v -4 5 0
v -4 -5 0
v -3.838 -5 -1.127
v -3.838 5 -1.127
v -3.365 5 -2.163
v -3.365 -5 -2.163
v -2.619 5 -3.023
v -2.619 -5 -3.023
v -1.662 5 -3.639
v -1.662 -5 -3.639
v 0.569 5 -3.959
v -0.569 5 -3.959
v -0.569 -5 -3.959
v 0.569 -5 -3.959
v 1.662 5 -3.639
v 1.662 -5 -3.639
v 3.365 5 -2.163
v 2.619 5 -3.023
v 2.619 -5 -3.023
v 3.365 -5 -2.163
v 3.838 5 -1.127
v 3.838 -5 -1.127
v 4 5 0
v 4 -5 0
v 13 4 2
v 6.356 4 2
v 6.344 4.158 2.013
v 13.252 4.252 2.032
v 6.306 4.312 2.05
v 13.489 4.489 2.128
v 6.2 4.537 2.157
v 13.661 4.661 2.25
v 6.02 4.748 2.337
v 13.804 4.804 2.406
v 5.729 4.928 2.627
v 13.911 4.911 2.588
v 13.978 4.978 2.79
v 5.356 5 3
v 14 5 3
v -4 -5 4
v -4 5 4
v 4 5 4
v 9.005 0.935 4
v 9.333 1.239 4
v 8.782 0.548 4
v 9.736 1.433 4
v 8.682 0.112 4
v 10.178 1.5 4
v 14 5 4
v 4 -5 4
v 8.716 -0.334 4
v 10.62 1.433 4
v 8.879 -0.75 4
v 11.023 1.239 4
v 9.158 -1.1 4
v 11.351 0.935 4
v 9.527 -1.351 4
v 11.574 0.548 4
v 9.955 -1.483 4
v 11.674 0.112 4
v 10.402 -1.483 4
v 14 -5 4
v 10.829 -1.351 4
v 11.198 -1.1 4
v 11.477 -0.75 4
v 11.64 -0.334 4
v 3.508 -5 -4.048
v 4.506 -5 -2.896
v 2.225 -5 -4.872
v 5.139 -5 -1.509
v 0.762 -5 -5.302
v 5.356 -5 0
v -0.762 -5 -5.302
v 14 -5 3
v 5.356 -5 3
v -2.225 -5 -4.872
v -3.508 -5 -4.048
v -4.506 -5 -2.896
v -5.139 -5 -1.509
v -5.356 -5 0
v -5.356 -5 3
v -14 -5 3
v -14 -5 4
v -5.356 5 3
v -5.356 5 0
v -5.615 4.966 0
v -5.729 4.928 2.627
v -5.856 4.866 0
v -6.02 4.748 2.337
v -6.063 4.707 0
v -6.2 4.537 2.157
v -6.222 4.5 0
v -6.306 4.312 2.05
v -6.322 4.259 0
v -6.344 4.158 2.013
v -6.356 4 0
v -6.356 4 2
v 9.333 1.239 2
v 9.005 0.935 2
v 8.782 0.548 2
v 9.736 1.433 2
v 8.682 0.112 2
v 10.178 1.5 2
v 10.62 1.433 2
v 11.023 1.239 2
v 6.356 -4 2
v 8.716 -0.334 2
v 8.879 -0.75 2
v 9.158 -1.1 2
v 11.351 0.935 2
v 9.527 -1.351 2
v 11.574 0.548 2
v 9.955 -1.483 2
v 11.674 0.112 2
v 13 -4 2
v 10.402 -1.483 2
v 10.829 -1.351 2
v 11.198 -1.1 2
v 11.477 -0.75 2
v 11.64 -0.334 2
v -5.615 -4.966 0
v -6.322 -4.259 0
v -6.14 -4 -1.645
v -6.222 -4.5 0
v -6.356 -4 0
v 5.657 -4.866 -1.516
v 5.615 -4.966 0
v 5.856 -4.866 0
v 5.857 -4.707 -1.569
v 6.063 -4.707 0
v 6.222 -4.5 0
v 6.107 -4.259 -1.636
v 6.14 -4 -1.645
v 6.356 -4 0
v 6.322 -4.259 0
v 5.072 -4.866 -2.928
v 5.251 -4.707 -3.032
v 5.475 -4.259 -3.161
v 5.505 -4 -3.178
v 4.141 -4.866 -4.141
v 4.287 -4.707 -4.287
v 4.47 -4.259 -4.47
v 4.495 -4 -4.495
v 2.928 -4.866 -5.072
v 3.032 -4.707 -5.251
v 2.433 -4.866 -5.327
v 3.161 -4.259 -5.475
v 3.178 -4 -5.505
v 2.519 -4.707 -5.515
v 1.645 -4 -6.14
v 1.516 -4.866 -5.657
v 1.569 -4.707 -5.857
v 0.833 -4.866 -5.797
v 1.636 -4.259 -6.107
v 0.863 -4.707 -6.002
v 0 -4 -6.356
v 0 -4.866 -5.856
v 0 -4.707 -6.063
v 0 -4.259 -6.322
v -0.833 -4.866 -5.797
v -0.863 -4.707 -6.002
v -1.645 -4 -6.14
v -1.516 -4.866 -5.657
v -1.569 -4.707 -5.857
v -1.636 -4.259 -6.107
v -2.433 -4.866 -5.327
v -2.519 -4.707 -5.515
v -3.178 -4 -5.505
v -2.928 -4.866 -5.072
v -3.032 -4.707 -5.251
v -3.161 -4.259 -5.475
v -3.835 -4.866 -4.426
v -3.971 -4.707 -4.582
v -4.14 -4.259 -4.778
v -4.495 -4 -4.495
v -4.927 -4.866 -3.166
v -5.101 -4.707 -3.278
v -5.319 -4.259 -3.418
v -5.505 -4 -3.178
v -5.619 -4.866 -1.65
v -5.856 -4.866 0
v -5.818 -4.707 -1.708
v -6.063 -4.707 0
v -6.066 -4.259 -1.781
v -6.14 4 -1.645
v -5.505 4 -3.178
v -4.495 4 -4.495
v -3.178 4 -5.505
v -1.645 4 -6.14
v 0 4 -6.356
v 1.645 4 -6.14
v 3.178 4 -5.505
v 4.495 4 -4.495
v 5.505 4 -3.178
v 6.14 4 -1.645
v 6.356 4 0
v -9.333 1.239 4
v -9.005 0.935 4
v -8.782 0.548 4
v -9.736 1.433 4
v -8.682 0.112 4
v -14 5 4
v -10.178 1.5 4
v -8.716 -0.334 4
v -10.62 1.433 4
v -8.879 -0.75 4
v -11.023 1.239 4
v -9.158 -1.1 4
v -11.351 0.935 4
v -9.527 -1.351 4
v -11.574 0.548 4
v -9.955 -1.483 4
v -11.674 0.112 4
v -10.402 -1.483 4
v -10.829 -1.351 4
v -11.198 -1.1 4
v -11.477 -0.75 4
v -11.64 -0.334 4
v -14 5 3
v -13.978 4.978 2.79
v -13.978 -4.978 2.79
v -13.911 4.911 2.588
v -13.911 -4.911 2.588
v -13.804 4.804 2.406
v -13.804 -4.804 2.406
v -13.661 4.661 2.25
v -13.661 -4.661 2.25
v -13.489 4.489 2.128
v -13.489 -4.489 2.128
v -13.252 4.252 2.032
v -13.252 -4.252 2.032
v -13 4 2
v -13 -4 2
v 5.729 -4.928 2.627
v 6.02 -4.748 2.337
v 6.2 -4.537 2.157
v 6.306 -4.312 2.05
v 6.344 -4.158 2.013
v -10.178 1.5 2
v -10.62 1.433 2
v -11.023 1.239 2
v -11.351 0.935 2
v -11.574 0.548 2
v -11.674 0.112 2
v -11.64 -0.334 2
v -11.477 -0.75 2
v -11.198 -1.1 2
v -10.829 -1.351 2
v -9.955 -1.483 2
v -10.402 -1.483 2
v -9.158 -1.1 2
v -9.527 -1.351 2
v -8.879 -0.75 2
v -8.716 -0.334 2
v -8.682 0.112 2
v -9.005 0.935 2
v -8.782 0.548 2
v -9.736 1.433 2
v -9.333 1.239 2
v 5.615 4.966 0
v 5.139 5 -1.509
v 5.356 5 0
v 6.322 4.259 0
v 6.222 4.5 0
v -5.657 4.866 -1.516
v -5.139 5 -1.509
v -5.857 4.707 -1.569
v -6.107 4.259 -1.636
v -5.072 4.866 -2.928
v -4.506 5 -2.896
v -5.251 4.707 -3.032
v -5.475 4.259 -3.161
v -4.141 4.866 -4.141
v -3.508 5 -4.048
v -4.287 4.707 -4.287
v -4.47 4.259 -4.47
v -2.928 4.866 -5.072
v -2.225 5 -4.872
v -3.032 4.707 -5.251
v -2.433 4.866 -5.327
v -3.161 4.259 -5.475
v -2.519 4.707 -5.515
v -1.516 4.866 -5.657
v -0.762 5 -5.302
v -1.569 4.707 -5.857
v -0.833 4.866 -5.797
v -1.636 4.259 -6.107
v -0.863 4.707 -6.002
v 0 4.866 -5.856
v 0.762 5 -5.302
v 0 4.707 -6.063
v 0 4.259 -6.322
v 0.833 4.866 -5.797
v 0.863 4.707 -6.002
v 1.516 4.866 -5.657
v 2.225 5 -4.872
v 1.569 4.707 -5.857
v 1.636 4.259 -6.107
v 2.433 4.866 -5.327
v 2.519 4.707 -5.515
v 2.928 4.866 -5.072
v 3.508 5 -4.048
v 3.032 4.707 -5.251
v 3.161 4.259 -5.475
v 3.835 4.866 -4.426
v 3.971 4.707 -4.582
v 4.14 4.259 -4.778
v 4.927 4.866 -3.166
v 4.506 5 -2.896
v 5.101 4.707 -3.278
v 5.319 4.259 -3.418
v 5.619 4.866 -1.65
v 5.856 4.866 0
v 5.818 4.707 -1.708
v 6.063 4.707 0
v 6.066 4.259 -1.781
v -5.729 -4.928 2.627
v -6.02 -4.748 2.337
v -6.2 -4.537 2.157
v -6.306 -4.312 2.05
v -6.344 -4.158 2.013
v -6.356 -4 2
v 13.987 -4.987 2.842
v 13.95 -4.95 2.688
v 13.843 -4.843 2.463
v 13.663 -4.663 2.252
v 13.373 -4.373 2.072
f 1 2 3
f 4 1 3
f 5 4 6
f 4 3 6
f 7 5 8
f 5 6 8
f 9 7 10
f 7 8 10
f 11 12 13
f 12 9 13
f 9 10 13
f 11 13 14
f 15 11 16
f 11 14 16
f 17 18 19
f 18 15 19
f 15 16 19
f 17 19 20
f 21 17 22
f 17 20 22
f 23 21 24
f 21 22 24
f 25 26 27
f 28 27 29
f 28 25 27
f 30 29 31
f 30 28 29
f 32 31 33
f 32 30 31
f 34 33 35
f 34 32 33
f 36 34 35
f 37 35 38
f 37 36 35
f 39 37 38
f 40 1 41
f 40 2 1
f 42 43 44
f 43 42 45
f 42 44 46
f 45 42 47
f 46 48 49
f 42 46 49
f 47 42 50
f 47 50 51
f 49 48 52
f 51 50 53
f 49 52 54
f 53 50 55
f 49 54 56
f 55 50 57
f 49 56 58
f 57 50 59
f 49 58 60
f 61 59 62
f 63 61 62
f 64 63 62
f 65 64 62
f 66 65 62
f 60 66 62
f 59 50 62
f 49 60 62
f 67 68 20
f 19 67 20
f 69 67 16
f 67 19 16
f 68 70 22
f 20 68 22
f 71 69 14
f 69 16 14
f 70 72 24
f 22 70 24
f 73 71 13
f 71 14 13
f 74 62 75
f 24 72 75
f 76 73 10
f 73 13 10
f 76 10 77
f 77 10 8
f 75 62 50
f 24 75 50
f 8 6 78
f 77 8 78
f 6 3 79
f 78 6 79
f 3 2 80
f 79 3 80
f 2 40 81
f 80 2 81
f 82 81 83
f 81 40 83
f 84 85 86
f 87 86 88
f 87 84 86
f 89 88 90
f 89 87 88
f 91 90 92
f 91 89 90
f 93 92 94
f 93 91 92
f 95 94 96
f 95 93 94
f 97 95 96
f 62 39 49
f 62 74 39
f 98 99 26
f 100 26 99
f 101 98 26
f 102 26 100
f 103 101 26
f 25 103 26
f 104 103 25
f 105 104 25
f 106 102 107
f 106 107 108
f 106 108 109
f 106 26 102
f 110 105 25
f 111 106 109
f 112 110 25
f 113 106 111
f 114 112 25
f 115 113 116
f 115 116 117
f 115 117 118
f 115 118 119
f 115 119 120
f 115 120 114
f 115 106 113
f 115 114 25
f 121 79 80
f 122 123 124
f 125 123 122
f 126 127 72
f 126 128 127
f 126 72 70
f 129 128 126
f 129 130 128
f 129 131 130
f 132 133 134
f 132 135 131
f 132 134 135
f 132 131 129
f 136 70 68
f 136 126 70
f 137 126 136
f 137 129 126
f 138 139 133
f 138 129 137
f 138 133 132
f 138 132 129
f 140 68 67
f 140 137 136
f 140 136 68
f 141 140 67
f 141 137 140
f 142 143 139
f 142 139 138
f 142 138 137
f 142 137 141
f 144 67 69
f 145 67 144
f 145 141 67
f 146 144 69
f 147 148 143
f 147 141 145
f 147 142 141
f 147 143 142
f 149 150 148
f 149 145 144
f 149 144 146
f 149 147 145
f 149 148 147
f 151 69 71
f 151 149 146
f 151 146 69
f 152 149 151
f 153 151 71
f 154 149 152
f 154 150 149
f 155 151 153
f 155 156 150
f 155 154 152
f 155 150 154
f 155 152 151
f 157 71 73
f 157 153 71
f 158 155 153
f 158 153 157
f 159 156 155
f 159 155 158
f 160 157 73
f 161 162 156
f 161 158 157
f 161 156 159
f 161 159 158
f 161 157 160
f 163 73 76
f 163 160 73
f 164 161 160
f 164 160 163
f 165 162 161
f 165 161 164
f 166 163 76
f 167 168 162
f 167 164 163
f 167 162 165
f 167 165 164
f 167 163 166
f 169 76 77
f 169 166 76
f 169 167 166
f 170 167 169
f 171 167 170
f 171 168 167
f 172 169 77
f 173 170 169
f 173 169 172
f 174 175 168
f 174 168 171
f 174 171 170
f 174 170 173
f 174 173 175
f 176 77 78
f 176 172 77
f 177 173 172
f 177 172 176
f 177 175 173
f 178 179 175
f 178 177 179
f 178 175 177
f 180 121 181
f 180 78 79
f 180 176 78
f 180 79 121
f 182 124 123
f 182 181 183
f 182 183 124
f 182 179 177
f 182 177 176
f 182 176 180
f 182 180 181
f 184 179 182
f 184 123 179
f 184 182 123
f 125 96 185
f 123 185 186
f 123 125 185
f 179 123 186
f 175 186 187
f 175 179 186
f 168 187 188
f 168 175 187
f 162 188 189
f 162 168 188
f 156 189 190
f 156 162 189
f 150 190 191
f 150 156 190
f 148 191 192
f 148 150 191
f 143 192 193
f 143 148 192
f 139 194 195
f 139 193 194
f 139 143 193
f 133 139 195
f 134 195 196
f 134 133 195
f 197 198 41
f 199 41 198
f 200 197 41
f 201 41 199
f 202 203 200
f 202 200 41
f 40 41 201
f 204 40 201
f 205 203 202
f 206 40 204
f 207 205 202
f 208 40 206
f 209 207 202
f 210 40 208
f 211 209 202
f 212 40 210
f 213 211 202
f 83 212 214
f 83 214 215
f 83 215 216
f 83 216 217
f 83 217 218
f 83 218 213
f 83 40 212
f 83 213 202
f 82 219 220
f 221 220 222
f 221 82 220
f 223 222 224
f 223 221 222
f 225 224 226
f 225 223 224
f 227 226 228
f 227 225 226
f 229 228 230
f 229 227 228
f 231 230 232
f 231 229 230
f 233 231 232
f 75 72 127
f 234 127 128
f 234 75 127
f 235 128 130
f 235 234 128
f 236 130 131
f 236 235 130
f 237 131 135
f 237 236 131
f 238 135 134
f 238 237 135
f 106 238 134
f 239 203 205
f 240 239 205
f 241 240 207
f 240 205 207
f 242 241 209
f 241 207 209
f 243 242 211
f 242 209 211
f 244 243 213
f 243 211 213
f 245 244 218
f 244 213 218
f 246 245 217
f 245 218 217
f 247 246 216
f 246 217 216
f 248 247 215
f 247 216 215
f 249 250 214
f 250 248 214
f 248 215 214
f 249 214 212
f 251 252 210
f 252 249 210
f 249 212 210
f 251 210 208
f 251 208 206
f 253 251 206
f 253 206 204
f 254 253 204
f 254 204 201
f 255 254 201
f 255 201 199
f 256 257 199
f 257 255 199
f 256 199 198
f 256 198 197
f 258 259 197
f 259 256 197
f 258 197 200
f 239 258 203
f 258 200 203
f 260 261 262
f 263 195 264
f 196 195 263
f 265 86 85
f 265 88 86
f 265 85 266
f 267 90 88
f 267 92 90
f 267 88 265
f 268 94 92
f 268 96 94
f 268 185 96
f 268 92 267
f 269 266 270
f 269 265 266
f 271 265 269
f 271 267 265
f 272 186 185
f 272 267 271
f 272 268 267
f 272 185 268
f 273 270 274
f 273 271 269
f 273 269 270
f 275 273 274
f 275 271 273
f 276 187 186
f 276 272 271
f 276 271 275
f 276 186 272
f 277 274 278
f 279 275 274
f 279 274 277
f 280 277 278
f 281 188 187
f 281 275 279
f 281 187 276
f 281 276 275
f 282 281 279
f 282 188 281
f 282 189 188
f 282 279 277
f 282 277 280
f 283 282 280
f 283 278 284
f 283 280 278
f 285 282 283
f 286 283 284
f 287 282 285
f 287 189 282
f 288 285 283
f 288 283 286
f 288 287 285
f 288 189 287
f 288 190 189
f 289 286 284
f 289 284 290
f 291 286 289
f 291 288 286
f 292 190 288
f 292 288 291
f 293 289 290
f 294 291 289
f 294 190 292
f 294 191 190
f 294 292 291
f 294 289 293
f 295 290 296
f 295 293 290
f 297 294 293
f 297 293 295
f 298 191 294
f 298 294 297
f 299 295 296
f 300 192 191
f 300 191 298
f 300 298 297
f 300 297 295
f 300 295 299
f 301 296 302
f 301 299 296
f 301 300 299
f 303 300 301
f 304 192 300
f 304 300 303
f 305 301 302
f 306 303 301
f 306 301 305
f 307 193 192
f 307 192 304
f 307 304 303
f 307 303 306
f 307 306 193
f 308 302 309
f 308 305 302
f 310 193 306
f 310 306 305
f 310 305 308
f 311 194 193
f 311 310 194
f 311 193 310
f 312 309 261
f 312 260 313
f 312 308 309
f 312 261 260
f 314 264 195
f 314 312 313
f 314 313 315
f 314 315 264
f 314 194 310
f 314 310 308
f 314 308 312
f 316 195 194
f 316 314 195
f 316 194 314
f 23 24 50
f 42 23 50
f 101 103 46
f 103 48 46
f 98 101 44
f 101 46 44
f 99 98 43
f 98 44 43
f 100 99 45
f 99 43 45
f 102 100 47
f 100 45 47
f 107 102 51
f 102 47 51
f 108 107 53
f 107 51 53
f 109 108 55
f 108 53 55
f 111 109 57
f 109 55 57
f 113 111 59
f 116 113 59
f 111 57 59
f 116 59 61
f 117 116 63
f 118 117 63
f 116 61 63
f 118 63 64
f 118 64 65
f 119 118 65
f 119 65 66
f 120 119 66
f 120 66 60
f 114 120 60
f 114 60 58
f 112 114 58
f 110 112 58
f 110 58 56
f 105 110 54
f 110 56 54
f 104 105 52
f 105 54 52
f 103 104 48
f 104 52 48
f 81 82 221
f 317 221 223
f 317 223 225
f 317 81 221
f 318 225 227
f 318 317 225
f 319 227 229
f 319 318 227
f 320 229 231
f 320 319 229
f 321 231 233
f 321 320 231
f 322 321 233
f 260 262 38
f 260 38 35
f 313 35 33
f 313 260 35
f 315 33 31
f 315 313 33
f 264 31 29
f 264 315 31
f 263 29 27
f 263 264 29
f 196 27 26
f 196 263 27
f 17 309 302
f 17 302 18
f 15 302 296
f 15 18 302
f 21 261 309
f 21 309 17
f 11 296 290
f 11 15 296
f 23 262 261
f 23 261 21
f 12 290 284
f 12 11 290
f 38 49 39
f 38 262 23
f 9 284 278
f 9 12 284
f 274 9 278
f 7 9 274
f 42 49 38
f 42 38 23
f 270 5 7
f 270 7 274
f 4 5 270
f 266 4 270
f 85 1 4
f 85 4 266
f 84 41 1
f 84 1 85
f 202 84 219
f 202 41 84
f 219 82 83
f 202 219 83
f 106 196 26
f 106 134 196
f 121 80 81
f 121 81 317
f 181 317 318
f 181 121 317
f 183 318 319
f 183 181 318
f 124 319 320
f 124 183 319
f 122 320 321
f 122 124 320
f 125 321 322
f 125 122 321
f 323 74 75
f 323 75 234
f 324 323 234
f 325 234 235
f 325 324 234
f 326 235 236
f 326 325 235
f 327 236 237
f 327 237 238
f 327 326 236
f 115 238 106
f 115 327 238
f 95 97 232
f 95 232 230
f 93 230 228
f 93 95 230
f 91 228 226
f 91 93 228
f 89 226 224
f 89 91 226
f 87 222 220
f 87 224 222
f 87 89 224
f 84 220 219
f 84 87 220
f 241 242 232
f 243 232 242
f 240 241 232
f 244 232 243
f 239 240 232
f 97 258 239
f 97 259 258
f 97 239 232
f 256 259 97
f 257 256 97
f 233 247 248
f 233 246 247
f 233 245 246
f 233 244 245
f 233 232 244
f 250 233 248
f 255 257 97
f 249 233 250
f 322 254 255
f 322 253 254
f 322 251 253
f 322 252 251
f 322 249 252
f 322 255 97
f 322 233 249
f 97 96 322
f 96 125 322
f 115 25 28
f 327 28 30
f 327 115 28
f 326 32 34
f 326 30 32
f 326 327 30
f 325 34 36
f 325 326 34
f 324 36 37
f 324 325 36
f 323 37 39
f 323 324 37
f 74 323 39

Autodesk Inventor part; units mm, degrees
ref_plane "YZ Plane" through (0, 0, 0) normal (1, 0, 0) x (0, 1, 0)
ref_plane "XZ Plane" through (0, 0, 0) normal (0, 1, 0) x (-1, 0, 0)
ref_plane "XY Plane" through (0, 0, 0) normal (0, 0, 1) x (1, 0, 0)
sketch "Sketch1" plane through (0, 0, 0) normal (0, 1, 0) x (-1, 0, 0)
  arc A0 (-4, 0) -> (4, 0) centre (0, 0) ccw
  line L0 (-4, 4) -> (-14, 4)
  line L1 (4, 4) -> (14, 4)
  line L2 (14, 2) -> (6.3562, 2)
  line L3 (-6.3562, 2) -> (-14, 2)
  line L4 (4, 0) -> (4, 4)
  line L5 (-4, 0) -> (-4, 4)
  line L6 (6.3562, 0) -> (6.3562, 2)
  line L7 (-6.3562, 0) -> (-6.3562, 2)
  arc A1 (-6.3562, 0) -> (6.3562, 0) centre (0, 0) ccw
  line L8 (14, 2) -> (14, 4)
  line L9 (-14, 2) -> (-14, 4)
  dimension "d0" = 8
  dimension "d2" = 2
  dimension "d3" = 10
  dimension "d4" = 10
  dimension "d5" = 6.3562
  dimension "d6" = 2
extrude "Extrusion1" add sketch "Sketch1" along normal mid plane 10
sketch "Sketch2" plane through (14, 5, 2) normal (0, 0, -1) x (-1, 0, 0)
  line L0 (0, -10) -> (0, 0) projected
  line L1 (0, 0) -> (7.6438, 0) projected
  point P0 (14, -5)
  point P1 (3.8219, -5)
  point P2 (0, -5)
  point P3 (3.8219, 0)
hole "Hole1" at (10.1781, 0, 2) direction (0, 0, 1) diameter 3 depth 2
mirror "Mirror1" about plane through (0, 0, 0) normal (1, 0, 0) of "Hole1"
fillet "Fillet1" radius 1 12 edges at (10.1781, 5, 2) (14, 0, 2) (10.1781, -5, 2) (-10.1781, 5, 2) (-14, 0, 2) (-10.1781, -5, 2) (-6.3562, 5, 1) (6.3562, 5, 1) (0, 5, -6.3562) (6.3562, -5, 1) (-6.3562, -5, 1) (0, -5, -6.3562)
properties part number "Part_B5"
